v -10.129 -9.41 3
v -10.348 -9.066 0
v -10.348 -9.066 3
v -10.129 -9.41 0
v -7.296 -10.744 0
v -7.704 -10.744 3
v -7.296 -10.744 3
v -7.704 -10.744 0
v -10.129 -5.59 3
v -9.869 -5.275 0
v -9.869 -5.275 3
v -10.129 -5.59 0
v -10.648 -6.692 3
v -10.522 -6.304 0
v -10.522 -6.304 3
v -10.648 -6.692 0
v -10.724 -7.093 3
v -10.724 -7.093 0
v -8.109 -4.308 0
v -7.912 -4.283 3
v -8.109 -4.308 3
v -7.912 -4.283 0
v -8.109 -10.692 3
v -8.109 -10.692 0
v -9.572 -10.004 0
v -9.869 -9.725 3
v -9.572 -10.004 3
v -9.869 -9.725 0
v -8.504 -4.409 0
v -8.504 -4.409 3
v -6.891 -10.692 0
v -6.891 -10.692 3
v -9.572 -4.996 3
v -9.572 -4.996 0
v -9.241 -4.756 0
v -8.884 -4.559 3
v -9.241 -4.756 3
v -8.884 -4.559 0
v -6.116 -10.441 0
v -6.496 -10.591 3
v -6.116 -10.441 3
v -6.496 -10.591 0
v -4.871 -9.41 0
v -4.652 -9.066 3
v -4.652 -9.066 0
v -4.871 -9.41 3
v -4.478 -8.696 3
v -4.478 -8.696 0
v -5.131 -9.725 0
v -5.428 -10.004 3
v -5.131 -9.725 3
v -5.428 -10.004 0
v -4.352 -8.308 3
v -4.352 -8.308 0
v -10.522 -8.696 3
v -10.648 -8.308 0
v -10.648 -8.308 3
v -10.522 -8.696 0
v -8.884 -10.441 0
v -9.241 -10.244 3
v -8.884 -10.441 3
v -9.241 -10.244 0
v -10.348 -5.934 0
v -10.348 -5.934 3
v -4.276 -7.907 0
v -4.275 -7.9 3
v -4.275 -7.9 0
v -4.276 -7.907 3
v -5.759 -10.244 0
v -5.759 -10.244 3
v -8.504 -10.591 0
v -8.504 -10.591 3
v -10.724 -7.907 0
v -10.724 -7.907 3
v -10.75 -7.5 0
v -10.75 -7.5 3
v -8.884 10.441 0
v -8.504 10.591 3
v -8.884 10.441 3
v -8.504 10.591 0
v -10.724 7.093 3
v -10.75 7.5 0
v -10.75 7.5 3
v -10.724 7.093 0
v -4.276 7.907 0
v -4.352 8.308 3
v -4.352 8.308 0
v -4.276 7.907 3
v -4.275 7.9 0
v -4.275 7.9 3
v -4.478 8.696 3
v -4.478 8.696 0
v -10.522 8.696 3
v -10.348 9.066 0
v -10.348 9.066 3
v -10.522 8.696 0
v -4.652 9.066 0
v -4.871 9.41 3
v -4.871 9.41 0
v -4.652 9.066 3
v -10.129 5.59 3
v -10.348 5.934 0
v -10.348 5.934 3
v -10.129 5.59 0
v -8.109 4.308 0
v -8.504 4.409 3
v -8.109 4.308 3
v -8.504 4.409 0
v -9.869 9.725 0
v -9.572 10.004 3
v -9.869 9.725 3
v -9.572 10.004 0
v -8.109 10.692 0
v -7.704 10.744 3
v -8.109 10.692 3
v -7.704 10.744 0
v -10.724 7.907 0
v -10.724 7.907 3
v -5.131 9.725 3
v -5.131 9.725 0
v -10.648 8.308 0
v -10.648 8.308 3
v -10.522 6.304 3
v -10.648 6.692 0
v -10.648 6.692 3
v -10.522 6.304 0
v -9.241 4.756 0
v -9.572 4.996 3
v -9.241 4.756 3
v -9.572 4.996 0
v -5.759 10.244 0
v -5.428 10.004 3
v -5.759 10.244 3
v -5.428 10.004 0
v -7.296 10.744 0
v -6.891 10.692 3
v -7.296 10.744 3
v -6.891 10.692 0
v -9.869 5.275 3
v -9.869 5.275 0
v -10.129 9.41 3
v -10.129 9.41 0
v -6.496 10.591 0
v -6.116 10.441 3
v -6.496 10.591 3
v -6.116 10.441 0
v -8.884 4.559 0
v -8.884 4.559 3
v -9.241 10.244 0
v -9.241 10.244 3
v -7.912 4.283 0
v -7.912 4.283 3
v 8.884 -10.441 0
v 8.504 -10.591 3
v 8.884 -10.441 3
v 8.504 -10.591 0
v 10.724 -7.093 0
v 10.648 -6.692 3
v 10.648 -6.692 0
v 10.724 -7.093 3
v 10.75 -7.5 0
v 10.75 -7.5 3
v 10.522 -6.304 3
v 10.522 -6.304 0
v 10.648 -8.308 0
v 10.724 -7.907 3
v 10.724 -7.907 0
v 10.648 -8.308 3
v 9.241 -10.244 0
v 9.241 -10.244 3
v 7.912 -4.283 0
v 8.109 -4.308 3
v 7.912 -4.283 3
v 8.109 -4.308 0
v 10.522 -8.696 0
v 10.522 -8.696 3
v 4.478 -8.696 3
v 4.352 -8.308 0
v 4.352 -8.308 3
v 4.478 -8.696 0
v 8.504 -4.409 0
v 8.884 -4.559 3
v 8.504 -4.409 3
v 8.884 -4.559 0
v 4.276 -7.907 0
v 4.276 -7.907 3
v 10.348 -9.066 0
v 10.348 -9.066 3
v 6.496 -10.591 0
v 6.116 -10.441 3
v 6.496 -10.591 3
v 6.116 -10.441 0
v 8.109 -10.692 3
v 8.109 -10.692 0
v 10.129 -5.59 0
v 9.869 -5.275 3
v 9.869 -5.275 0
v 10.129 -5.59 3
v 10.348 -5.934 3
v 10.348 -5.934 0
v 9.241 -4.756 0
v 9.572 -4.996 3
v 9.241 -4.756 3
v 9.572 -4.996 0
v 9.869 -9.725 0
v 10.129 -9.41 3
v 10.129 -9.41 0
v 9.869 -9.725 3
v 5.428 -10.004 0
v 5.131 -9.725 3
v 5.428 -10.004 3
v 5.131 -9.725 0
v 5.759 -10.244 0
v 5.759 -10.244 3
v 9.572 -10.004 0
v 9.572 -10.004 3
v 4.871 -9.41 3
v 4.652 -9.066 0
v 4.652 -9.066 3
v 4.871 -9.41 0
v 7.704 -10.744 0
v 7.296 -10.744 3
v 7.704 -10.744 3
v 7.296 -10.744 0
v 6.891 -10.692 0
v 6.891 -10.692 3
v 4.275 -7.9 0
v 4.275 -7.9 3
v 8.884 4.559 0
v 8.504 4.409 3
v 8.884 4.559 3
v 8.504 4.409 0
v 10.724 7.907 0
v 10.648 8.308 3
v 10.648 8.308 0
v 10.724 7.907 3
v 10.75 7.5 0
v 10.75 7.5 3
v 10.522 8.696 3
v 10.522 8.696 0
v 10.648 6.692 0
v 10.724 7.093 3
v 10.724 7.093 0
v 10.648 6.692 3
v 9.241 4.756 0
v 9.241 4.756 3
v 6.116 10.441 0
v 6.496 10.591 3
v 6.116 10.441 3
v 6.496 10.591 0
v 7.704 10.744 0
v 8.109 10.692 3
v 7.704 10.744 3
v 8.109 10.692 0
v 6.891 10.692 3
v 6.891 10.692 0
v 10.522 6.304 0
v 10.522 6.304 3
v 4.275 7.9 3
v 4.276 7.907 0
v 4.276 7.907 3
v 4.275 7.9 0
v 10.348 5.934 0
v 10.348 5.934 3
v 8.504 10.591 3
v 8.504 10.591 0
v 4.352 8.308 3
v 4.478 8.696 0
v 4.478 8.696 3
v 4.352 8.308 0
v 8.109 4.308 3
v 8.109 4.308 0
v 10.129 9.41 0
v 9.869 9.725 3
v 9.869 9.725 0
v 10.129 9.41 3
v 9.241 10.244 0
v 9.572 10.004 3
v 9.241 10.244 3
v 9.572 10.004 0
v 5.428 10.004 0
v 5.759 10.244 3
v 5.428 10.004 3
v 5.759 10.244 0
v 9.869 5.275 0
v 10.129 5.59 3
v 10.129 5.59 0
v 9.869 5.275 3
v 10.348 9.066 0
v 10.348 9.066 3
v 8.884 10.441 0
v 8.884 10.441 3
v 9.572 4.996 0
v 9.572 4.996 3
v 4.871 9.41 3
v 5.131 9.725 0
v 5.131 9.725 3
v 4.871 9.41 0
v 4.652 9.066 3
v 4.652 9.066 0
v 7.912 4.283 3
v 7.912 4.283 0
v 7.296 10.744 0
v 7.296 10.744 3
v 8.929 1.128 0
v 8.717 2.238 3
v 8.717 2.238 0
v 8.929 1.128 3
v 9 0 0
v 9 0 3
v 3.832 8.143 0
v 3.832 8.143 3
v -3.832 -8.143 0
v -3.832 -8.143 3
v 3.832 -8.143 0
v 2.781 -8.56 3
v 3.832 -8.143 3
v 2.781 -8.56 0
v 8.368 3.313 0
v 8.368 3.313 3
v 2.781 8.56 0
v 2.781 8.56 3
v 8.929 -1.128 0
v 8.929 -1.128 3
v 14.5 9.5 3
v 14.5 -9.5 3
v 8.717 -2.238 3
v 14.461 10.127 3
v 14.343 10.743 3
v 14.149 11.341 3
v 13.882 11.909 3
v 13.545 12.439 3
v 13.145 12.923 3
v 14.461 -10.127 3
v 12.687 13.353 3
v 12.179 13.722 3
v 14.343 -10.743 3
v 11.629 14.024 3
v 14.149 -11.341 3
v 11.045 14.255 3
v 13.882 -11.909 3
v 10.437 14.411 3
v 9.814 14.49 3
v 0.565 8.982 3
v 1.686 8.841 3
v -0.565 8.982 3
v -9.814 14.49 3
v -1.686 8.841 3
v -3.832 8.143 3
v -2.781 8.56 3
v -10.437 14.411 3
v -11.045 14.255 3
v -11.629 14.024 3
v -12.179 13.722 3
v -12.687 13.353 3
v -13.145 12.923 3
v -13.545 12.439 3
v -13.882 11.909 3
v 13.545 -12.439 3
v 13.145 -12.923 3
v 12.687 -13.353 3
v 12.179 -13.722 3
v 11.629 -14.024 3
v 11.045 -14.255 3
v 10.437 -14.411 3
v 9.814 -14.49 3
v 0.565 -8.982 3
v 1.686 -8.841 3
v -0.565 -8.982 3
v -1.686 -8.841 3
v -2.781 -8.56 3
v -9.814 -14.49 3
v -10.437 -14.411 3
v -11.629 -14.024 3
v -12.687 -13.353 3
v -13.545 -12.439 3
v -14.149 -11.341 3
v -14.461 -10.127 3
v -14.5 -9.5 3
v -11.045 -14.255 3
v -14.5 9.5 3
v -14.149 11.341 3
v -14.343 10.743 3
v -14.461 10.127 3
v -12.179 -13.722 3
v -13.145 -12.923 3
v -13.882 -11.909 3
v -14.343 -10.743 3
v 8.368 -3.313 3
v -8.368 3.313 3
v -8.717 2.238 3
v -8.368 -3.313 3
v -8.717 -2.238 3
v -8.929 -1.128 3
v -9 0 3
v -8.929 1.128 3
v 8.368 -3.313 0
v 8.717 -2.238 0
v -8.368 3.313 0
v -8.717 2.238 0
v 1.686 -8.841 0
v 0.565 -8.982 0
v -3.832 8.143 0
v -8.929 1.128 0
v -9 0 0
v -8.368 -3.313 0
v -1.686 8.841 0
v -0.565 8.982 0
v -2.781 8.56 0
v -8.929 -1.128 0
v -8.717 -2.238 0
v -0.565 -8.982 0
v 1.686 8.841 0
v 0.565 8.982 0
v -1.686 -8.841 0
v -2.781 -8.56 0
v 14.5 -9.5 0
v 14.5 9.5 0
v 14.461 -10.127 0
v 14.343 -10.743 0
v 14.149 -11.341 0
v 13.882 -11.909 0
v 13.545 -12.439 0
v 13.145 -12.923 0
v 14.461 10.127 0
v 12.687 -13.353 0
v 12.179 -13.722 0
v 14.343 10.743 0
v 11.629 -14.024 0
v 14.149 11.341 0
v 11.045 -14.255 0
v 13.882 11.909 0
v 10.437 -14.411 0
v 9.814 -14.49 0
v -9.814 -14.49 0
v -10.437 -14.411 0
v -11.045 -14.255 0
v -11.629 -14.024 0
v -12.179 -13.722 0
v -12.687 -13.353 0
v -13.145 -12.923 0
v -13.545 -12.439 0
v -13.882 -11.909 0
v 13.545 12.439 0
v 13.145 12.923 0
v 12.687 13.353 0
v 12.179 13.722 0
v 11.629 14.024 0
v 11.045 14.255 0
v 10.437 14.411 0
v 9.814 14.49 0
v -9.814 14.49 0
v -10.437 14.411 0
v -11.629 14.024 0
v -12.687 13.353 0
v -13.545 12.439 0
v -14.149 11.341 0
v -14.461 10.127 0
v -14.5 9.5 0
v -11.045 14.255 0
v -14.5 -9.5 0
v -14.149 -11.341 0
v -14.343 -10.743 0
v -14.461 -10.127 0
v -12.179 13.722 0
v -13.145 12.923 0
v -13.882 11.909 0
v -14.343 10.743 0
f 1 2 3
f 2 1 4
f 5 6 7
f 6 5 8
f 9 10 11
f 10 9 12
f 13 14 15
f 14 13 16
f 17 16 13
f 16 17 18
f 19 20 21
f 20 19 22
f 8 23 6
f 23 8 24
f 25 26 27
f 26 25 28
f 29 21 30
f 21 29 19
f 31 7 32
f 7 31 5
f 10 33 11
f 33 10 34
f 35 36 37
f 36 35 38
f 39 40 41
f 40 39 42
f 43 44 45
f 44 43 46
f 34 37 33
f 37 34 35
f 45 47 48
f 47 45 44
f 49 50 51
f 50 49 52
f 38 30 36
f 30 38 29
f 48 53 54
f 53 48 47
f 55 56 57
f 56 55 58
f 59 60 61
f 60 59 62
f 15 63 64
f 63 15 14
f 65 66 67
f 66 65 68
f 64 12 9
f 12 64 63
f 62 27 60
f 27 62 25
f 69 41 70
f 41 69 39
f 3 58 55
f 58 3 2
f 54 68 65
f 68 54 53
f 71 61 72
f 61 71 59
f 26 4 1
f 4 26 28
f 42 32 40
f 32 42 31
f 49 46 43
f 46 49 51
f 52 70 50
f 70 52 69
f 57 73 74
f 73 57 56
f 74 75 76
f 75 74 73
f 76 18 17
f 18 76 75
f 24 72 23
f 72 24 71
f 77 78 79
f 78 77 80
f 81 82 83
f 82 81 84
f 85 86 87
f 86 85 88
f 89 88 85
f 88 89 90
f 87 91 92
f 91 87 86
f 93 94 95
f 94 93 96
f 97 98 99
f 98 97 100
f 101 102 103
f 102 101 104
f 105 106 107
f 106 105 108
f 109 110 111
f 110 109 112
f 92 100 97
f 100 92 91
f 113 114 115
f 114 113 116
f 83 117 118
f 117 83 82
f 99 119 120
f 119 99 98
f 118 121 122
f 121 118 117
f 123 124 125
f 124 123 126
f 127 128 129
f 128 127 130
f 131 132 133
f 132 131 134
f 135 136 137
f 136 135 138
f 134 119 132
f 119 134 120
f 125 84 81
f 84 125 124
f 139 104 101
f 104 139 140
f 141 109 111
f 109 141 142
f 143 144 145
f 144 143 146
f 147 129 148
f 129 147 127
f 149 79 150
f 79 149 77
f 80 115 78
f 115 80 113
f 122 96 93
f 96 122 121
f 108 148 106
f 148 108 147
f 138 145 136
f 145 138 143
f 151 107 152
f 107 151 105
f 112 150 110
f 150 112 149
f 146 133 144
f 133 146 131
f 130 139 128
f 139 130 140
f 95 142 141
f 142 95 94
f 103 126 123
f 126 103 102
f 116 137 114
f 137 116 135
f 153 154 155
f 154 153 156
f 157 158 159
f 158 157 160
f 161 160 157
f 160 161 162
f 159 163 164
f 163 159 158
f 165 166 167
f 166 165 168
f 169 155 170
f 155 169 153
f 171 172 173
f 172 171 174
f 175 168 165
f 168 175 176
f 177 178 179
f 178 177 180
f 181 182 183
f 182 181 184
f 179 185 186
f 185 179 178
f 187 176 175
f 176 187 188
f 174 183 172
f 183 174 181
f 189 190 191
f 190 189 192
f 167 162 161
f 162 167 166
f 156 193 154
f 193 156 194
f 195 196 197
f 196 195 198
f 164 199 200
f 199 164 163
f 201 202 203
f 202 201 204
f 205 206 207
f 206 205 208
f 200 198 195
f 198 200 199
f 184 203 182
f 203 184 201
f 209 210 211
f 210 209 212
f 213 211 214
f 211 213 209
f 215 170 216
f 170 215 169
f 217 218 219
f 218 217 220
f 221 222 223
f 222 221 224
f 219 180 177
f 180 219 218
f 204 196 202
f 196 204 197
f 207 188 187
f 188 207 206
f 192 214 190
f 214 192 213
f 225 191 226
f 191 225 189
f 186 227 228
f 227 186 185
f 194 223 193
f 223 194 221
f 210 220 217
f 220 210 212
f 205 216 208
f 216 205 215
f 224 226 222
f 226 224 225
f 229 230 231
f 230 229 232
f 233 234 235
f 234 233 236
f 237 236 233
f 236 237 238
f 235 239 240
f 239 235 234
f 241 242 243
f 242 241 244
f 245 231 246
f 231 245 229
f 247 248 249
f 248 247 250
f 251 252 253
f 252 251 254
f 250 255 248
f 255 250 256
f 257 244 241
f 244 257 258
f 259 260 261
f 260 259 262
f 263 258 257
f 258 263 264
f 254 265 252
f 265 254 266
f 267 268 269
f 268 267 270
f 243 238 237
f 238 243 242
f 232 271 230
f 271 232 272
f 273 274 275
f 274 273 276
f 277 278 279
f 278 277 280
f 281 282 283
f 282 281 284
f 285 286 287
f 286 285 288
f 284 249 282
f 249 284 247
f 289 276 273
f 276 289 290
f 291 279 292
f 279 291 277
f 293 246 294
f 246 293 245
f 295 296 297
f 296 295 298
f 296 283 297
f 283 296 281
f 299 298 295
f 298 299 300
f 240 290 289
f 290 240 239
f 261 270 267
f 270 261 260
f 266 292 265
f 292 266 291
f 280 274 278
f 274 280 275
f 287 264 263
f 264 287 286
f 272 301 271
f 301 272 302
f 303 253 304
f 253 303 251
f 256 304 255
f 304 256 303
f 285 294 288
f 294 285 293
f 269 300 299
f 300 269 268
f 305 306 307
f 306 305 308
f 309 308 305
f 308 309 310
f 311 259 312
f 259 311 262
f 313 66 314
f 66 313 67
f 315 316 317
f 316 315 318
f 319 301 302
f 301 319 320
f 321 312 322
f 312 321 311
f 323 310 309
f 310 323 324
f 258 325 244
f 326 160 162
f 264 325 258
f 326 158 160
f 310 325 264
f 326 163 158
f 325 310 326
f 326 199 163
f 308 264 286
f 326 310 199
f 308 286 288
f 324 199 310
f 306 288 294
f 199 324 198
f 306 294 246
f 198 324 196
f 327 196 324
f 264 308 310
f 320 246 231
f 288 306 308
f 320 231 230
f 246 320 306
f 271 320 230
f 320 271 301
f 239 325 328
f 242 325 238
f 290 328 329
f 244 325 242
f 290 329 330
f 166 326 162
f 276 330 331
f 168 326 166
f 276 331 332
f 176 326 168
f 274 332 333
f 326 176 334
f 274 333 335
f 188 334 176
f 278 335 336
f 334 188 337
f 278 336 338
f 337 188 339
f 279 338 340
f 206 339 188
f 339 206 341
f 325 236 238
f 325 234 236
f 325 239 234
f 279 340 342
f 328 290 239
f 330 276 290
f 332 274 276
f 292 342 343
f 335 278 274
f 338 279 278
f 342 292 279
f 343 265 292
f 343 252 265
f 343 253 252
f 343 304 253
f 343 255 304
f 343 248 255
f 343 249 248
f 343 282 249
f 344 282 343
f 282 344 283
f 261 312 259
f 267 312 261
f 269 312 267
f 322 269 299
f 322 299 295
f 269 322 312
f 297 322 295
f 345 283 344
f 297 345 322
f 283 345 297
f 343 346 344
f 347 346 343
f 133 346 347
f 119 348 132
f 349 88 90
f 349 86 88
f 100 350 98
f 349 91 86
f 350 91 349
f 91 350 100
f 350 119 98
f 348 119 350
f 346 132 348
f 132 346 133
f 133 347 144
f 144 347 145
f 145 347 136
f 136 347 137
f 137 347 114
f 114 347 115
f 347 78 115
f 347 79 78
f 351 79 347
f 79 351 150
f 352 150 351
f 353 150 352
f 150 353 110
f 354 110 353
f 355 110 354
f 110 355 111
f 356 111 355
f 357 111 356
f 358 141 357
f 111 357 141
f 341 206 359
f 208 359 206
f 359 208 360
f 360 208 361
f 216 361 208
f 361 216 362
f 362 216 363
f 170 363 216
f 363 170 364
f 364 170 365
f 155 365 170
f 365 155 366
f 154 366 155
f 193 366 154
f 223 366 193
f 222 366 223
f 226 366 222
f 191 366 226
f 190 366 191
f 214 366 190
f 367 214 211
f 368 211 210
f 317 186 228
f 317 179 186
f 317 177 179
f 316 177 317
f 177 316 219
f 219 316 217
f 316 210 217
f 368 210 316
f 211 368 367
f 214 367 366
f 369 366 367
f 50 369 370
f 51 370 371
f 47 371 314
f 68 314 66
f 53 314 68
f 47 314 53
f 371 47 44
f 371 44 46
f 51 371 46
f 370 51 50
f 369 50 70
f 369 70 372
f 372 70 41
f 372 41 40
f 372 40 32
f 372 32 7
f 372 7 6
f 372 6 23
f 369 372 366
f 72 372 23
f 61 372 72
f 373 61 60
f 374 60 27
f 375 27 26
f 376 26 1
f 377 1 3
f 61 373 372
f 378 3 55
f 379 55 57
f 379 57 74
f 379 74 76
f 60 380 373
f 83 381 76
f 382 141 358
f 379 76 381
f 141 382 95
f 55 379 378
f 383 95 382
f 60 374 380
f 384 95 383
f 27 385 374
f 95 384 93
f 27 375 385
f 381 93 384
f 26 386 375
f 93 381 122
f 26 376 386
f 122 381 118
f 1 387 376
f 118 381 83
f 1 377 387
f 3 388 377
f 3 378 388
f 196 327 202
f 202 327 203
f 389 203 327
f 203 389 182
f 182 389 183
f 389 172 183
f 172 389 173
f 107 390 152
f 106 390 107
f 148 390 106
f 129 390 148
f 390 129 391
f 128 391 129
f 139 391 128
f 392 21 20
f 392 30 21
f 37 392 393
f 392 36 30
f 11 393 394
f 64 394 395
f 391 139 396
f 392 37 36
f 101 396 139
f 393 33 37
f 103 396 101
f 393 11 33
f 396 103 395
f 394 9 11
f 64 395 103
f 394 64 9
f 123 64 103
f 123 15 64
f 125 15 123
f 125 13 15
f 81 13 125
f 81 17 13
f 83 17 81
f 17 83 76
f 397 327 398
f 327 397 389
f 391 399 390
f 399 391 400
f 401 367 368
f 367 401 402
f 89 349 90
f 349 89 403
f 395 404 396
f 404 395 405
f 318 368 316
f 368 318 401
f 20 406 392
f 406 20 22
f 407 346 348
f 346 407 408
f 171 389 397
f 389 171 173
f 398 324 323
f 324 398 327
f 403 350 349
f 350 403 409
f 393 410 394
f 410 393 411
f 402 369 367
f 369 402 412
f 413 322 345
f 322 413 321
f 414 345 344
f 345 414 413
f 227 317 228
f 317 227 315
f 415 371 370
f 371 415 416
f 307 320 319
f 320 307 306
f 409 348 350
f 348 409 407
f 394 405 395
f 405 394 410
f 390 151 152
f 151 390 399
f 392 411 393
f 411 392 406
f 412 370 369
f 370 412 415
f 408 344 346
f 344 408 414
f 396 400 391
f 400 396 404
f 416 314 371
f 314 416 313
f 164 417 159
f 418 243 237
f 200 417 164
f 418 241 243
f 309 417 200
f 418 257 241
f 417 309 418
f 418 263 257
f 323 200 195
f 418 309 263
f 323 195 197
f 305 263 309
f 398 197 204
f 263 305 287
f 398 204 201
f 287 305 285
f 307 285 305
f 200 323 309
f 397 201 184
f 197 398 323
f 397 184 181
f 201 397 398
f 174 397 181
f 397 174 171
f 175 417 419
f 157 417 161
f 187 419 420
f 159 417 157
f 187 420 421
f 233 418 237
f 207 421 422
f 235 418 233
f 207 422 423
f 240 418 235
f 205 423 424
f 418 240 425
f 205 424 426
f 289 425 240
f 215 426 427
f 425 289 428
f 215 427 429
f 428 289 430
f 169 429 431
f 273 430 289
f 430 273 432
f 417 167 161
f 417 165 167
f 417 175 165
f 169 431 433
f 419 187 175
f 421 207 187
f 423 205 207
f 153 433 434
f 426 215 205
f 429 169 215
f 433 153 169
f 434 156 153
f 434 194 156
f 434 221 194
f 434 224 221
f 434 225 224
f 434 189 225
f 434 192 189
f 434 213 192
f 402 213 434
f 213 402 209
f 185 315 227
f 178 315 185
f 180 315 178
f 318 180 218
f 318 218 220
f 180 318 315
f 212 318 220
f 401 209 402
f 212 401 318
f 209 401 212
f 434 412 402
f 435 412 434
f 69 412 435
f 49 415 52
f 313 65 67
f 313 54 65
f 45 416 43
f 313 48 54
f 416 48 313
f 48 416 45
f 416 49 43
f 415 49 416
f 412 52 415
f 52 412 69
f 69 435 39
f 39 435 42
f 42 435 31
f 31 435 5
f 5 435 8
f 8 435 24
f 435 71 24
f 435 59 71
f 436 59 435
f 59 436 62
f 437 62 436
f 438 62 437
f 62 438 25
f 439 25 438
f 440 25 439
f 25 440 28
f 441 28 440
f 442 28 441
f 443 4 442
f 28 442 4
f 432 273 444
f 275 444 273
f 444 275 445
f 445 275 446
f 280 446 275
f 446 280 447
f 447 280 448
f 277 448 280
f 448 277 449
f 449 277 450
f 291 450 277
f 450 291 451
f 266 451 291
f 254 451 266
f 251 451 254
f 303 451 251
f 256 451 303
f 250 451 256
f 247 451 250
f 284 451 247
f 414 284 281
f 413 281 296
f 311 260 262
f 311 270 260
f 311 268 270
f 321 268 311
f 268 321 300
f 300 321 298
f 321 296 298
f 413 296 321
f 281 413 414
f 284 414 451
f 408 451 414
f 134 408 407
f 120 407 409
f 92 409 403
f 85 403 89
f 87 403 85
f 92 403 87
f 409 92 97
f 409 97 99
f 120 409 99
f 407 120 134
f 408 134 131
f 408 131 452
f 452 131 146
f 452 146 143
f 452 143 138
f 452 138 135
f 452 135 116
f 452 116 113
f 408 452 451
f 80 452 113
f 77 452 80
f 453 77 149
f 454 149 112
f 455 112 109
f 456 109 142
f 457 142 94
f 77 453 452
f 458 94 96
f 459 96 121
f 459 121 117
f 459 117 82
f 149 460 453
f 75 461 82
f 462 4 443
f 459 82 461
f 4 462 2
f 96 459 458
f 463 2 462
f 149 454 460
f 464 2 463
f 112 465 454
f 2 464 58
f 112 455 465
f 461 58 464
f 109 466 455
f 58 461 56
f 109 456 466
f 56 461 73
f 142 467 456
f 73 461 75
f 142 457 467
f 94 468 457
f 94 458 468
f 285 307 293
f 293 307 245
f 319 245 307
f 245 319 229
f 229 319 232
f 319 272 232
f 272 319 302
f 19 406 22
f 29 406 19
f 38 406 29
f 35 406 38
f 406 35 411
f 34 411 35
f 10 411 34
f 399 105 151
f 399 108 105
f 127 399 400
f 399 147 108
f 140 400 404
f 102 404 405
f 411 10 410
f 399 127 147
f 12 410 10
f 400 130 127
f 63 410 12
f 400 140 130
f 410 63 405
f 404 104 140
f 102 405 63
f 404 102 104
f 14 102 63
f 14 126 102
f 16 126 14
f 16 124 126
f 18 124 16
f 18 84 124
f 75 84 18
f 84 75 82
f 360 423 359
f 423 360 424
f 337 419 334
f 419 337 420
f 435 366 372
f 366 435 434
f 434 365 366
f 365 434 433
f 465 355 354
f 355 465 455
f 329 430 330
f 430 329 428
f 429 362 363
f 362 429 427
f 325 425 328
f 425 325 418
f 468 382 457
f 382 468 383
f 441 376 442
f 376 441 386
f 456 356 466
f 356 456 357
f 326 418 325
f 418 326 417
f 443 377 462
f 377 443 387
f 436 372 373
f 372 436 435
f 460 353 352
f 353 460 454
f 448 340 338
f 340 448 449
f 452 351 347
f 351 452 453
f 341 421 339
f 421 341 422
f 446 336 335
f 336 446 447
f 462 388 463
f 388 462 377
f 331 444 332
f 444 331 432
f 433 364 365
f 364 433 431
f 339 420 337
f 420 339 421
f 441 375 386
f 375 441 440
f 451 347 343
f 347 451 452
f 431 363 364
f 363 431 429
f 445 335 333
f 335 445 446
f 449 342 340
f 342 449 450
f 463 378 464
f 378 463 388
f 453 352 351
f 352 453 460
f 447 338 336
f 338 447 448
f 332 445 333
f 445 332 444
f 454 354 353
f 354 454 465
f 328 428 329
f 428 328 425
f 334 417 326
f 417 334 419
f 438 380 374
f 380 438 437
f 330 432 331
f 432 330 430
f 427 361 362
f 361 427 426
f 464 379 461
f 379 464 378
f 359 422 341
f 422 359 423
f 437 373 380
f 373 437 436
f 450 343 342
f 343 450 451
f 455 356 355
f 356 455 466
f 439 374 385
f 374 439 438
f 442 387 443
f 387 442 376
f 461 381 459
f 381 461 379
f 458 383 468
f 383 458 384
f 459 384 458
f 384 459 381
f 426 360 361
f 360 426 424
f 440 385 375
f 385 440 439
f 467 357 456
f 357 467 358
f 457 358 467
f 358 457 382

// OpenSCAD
$fn = 50;


difference() {
	union() {
		hull() {
			translate(v = [-9.5000000000, 9.5000000000, 0]) {
				cylinder(h = 3, r = 5);
			}
			translate(v = [9.5000000000, 9.5000000000, 0]) {
				cylinder(h = 3, r = 5);
			}
			translate(v = [-9.5000000000, -9.5000000000, 0]) {
				cylinder(h = 3, r = 5);
			}
			translate(v = [9.5000000000, -9.5000000000, 0]) {
				cylinder(h = 3, r = 5);
			}
		}
	}
	union() {
		#translate(v = [-7.5000000000, -7.5000000000, -100.0000000000]) {
			cylinder(h = 200, r = 3.2500000000);
		}
		#translate(v = [-7.5000000000, 7.5000000000, -100.0000000000]) {
			cylinder(h = 200, r = 3.2500000000);
		}
		#translate(v = [7.5000000000, -7.5000000000, -100.0000000000]) {
			cylinder(h = 200, r = 3.2500000000);
		}
		#translate(v = [7.5000000000, 7.5000000000, -100.0000000000]) {
			cylinder(h = 200, r = 3.2500000000);
		}
		#cylinder(h = 3, r = 9.0000000000);
	}
}
